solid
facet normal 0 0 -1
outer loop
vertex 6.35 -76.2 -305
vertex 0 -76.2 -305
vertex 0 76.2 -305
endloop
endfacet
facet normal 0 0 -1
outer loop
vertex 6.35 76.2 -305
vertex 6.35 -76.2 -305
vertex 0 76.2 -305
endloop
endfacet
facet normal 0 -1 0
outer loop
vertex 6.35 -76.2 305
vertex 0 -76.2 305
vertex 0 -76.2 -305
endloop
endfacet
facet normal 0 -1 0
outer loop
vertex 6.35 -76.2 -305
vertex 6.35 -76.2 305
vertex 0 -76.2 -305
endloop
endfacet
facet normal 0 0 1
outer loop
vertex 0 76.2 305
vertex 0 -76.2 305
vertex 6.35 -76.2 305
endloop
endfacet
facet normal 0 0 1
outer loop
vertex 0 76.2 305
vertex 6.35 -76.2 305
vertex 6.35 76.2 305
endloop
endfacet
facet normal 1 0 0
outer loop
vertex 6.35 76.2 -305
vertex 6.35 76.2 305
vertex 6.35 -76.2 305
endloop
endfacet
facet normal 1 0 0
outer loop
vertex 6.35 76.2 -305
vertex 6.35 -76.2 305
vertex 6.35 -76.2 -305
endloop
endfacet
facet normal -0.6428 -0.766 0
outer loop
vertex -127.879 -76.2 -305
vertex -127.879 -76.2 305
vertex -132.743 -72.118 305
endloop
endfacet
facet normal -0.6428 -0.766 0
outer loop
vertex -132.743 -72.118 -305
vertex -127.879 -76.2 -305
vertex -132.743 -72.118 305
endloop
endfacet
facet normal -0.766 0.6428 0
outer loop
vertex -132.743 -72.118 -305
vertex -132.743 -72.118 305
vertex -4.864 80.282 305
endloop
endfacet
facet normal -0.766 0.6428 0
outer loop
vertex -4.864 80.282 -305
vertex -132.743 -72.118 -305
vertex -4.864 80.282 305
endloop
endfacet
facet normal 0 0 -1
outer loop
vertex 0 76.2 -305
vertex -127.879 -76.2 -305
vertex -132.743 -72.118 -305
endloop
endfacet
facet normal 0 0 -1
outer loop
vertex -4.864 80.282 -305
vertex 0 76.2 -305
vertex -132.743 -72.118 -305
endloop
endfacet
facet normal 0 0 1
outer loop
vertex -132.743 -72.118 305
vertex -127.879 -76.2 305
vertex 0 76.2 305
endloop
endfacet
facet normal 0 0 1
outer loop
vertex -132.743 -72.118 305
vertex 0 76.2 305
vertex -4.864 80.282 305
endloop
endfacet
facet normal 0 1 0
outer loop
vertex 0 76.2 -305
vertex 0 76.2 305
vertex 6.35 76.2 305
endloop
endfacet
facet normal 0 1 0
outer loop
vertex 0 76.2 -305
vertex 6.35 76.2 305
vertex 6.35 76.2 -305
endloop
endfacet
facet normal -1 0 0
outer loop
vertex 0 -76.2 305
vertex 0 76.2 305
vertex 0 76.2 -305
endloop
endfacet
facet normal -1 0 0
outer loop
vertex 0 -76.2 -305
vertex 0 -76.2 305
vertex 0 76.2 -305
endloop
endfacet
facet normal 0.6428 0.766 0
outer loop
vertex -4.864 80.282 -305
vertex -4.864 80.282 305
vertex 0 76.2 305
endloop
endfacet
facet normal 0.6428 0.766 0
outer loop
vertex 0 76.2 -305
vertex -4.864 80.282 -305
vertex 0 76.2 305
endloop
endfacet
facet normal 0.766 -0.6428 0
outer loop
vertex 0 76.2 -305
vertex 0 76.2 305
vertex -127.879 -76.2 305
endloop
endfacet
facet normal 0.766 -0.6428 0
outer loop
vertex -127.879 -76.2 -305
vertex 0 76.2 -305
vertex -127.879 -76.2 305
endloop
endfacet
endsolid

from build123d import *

# Parameters (mm, degrees)
SKETCH1_W           = 610
SKETCH1_H           = 152.4
BOSS_EXTRUDE1_DEPTH = 6.35
BOSS_EXTRUDE2_DEPTH = 610


with BuildPart() as part:
    # Sketch1 → Boss-Extrude1 (new body)
    with BuildSketch(Plane(origin=(0, 0, 0), x_dir=(0, 0, -1), z_dir=(1, 0, 0))):
        Rectangle(SKETCH1_W, SKETCH1_H)
    extrude(amount=BOSS_EXTRUDE1_DEPTH)


with BuildPart() as body_2:
    # Sketch2 → Boss-Extrude2 (new body)
    with BuildSketch(Plane(origin=(0, 0, -305), x_dir=(-1, 0, 0), z_dir=(0, 0, -1))):
        Polygon((0, 76.2), (127.878783791, -76.2), (132.743166005, -72.118298678), (4.864382214, 80.281701322), align=None)
    extrude(amount=-BOSS_EXTRUDE2_DEPTH)


solid = Compound([part.part, body_2.part])
